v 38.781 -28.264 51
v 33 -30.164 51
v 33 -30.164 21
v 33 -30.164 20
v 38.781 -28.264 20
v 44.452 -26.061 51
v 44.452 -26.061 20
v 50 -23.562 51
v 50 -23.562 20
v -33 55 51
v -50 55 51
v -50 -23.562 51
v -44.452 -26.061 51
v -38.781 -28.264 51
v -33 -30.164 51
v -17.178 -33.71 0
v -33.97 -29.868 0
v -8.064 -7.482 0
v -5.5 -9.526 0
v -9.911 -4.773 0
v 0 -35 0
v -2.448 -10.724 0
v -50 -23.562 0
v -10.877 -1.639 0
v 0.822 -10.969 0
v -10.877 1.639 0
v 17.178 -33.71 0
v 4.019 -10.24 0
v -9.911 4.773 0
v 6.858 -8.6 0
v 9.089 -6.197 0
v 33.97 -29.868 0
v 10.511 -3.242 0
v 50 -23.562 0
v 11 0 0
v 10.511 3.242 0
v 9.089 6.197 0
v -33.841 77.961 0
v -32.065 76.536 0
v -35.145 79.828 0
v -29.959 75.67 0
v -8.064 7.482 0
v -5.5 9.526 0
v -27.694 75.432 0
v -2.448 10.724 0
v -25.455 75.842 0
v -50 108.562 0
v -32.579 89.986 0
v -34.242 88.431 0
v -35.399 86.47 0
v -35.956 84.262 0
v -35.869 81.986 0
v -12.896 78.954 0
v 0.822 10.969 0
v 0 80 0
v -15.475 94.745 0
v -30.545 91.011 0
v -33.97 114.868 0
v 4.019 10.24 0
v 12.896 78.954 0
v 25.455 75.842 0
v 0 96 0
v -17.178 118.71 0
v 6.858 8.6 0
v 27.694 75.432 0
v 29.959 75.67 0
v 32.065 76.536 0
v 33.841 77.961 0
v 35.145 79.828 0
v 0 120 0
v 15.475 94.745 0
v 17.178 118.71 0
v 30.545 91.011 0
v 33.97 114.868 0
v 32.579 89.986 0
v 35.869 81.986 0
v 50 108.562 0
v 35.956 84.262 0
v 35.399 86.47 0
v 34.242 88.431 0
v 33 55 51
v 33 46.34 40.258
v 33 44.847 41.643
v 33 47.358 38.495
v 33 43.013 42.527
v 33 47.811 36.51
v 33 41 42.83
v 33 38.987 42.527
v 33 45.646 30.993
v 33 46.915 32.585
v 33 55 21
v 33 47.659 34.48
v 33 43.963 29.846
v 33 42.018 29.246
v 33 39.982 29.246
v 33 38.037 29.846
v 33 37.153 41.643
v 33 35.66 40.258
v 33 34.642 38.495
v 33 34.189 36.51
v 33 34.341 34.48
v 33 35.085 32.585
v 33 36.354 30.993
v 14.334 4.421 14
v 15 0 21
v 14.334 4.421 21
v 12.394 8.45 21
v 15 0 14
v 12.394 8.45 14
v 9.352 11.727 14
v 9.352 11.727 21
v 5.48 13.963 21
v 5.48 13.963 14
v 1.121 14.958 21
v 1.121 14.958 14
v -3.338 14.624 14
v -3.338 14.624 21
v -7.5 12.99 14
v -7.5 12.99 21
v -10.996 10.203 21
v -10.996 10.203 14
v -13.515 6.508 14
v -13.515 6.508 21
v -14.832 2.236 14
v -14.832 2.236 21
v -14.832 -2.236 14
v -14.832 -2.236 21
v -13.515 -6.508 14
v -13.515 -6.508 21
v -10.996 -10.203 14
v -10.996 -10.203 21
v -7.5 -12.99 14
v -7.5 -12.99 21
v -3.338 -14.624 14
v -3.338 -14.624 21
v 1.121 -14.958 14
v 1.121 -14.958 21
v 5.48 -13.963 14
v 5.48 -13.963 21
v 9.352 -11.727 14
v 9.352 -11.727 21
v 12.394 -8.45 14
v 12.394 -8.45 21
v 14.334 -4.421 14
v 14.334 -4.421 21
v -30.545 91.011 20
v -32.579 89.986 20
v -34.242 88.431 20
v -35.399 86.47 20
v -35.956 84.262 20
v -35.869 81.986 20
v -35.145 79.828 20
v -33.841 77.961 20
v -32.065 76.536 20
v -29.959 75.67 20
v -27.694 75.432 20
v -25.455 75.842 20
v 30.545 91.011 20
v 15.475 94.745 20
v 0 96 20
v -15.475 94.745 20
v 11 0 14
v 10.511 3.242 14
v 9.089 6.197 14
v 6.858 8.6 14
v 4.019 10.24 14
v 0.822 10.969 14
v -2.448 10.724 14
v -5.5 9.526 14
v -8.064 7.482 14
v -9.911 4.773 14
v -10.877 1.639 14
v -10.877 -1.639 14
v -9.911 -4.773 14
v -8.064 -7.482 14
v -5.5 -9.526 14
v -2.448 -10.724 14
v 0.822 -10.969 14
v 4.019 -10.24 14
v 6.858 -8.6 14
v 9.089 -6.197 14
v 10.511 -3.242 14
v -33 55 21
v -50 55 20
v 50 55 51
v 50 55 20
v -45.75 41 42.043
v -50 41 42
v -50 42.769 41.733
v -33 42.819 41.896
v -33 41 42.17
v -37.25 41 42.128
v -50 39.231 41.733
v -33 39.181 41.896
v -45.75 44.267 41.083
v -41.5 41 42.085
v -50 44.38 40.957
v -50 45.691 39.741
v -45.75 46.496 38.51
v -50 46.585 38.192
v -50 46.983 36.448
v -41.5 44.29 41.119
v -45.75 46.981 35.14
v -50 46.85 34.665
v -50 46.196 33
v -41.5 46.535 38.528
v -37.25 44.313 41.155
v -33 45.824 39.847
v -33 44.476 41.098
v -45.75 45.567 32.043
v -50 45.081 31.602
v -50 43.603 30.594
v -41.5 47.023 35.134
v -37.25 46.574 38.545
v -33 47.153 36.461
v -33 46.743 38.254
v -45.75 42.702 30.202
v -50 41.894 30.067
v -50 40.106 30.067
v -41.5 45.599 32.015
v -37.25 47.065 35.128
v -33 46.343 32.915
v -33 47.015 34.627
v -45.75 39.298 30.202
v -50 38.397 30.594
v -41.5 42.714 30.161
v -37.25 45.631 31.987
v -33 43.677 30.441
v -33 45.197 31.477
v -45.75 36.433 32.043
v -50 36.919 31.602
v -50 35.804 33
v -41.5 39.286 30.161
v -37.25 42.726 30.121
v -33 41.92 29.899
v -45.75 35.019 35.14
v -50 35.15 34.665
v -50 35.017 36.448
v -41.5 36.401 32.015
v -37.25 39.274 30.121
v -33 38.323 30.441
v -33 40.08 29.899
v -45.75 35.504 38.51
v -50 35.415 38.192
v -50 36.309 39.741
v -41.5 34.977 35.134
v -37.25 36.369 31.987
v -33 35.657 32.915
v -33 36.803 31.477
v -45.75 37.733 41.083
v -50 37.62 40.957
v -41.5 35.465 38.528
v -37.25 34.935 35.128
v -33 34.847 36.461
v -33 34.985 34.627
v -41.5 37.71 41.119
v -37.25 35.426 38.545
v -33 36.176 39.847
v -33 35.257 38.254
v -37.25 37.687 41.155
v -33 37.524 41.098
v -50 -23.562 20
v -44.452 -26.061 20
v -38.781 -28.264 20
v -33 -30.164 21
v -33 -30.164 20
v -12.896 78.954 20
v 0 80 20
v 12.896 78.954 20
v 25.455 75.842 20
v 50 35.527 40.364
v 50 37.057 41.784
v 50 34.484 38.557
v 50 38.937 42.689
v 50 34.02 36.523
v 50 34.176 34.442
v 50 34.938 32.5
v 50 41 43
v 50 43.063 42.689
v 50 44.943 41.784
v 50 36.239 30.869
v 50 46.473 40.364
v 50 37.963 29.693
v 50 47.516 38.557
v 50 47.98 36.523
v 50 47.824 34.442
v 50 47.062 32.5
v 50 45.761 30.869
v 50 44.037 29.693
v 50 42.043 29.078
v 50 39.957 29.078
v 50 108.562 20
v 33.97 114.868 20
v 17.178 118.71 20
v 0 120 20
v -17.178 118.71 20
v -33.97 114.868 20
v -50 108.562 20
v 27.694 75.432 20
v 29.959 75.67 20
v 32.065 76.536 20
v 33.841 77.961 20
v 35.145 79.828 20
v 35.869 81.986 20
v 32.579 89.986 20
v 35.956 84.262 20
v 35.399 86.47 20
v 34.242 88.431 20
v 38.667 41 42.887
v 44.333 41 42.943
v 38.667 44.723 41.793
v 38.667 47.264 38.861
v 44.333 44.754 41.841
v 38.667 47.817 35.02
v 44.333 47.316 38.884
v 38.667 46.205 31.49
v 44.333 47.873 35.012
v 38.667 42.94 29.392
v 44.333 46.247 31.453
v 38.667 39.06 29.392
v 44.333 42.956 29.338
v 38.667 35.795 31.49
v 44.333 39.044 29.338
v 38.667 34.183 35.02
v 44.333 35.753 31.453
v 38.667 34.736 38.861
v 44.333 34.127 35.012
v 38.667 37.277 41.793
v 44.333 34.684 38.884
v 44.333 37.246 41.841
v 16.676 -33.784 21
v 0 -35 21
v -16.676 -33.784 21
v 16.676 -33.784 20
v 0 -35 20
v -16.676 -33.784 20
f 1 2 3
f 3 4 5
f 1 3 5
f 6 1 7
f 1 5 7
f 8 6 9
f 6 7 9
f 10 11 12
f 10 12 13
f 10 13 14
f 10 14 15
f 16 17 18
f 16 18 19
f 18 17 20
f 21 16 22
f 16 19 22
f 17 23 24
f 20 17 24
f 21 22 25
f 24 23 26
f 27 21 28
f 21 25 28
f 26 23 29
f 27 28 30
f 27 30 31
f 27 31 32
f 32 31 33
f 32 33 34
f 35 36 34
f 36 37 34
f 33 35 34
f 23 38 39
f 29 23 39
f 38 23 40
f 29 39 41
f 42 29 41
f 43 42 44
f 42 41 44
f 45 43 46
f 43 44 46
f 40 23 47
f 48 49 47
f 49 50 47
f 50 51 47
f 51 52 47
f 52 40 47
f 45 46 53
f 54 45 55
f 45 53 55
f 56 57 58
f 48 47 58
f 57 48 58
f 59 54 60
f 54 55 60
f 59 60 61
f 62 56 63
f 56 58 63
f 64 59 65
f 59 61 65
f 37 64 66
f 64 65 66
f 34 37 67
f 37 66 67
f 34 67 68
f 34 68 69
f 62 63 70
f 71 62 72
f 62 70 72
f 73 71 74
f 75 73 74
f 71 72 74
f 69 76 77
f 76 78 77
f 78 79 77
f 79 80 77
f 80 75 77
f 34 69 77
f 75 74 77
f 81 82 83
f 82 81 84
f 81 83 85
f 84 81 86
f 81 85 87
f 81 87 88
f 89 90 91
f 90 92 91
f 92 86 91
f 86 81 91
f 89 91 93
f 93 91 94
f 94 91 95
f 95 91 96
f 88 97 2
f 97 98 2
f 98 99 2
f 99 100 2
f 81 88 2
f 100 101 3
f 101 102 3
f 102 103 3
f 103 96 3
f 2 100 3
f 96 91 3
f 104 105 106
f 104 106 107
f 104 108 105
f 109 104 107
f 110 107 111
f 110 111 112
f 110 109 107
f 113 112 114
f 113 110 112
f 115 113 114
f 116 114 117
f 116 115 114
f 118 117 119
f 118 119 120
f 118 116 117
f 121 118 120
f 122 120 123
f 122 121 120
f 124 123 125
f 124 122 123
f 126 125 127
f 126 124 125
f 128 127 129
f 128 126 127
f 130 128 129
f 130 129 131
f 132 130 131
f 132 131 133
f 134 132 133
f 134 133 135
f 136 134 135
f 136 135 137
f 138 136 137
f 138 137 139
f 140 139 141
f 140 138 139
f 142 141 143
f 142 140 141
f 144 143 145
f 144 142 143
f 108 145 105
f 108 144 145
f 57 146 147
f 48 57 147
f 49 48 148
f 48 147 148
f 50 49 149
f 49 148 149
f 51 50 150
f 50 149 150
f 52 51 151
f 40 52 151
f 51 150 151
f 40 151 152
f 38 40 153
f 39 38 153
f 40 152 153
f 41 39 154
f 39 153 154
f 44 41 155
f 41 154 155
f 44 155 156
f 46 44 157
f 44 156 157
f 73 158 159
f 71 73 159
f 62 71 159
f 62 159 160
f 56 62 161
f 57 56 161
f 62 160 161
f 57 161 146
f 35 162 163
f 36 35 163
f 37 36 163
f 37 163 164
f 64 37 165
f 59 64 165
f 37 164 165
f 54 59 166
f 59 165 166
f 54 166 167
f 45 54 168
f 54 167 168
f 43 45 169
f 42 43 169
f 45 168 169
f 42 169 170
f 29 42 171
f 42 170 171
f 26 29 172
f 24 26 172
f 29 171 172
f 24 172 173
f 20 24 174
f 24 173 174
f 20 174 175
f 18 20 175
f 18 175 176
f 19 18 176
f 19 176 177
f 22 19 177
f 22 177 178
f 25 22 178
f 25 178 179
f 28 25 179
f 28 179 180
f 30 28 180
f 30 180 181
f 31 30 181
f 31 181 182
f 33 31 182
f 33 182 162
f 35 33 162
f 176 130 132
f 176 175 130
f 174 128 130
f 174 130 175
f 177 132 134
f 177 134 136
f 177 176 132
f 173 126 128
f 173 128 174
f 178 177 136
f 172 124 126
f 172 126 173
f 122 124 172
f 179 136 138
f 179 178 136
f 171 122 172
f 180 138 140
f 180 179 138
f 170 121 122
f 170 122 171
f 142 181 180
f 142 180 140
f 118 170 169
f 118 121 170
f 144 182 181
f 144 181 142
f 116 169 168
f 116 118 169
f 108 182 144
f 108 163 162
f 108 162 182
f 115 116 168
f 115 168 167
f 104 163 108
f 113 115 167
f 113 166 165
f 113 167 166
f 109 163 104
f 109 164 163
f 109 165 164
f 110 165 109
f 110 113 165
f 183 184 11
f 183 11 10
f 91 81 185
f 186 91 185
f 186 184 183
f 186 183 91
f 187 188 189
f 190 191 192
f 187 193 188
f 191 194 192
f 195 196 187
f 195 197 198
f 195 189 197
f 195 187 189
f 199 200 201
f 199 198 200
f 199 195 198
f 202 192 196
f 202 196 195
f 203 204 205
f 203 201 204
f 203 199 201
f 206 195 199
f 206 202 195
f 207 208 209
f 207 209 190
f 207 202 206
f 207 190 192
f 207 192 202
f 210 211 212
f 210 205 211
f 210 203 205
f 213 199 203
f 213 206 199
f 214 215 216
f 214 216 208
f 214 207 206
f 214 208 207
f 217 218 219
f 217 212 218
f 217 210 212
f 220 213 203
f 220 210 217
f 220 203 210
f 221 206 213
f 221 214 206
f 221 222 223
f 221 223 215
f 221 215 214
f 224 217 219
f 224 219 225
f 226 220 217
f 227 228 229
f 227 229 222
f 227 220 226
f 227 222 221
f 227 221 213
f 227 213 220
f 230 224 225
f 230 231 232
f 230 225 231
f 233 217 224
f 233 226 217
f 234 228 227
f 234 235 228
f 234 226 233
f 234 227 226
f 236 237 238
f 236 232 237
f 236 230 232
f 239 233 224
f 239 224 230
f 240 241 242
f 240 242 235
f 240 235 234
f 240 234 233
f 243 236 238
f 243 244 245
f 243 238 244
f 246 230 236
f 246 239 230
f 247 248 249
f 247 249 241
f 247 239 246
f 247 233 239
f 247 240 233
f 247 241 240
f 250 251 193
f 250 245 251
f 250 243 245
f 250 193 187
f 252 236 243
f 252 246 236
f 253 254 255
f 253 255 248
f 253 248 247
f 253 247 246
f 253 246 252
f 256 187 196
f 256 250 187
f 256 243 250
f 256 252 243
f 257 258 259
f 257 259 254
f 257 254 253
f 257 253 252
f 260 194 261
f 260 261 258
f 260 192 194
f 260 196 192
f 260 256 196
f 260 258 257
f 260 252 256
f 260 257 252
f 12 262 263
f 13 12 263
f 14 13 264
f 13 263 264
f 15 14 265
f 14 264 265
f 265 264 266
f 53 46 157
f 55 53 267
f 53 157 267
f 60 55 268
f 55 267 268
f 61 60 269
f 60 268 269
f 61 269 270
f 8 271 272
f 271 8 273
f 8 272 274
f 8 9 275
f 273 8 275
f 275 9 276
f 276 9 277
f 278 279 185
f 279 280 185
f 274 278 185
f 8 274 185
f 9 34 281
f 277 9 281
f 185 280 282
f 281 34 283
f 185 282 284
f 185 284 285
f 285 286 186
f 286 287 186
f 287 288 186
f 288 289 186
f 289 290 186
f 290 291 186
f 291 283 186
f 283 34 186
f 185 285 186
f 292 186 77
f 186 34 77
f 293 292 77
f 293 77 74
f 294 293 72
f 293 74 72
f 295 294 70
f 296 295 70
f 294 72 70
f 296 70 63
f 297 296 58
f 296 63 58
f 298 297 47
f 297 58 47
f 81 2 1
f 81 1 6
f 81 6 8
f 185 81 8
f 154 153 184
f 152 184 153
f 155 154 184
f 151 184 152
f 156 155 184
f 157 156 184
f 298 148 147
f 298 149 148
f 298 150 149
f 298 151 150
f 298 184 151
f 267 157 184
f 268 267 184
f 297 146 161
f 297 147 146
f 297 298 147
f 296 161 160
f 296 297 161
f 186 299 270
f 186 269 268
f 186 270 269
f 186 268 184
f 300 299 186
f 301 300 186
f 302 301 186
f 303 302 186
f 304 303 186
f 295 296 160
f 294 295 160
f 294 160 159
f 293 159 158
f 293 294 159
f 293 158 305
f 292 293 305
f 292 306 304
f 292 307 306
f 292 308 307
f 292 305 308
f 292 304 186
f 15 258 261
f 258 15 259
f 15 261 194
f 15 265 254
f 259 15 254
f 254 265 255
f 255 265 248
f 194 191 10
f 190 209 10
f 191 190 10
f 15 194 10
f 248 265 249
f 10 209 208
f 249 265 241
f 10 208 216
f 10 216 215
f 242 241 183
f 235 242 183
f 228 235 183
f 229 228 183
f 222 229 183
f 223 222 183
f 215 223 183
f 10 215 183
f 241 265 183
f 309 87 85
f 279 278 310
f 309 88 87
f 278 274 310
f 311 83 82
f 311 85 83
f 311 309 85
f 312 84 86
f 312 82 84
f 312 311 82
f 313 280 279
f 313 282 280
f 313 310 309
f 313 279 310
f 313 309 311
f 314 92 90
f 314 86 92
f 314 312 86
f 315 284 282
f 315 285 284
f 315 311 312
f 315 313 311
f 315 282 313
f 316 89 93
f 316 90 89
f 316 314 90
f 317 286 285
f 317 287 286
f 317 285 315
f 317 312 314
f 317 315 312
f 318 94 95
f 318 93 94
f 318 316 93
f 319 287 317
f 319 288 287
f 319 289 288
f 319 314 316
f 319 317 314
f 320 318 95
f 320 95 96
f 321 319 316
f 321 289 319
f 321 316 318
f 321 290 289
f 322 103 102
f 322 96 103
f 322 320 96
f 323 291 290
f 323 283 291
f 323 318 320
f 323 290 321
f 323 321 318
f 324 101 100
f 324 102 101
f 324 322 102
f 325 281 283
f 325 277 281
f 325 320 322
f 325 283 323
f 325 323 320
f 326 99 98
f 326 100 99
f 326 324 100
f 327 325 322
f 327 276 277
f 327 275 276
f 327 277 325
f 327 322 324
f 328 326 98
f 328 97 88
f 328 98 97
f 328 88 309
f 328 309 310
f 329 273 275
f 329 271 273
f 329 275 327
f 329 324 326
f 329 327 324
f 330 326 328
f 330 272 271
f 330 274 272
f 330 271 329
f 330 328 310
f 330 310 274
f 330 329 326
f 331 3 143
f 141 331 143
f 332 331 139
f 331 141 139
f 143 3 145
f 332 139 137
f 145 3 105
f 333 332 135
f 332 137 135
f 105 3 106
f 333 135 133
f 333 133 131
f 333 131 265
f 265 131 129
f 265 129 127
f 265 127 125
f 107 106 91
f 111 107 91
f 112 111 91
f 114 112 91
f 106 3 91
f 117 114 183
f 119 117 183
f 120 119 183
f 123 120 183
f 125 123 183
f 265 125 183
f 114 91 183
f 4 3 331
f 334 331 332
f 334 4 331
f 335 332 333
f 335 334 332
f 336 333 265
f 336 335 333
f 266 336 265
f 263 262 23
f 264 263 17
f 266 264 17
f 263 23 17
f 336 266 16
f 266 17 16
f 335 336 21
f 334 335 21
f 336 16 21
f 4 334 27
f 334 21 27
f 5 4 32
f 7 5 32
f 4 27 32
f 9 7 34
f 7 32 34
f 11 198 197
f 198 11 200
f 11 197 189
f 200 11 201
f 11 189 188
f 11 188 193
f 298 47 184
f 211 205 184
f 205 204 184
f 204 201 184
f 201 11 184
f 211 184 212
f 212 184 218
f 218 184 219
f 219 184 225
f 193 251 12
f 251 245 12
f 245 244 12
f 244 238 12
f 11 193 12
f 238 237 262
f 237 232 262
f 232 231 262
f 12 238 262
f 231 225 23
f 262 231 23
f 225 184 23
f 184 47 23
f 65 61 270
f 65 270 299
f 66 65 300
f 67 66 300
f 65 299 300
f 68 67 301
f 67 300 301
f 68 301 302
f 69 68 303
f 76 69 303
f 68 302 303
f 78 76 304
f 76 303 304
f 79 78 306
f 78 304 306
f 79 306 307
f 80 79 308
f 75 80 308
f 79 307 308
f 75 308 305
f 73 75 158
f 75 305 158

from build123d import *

# Parameters (mm, degrees)
BOSS_EXTRUDE1_DEPTH = 20
BOSS_EXTRUDE2_DEPTH = 31
SKETCH8_R           = 15
SKETCH8_R_2         = 11
CUT_EXTRUDE4_DEPTH  = 6
SKETCH8_2_R         = 11
CUT_EXTRUDE5_DEPTH  = 134.645052284
SKETCH10_R          = 6
SKETCH9_R           = 7
CUT_EXTRUDE6_DEPTH  = 134.645052321
SKETCH12_R          = 15
BOSS_EXTRUDE3_DEPTH = 1


with BuildPart() as part:
    # Sketch1 → Boss-Extrude1 (new body)
    with BuildSketch(Plane.XY):
        with BuildLine():
            ThreePointArc((50, 108.561575886), (0, 120), (-50, 108.561575886))
            Line((-50, 108.561575886), (-50, -23.561575886))
            ThreePointArc((-50, -23.561575886), (0, -35), (50, -23.561575886))
            Line((50, -23.561575886), (50, 108.561575886))
        make_face()
    extrude(amount=BOSS_EXTRUDE1_DEPTH)

    # Sketch2 → Boss-Extrude2 (add)
    with BuildSketch(Plane.XY.offset(20)):
        with BuildLine():
            Line((-50, 55), (-50, -23.561575886))
            ThreePointArc((-50, -23.561575886), (-41.631074926, -27.200063435), (-33, -30.163514831))
            Line((-33, -30.163514831), (-33, 55))
            Line((-33, 55), (-50, 55))
        make_face()
        with BuildLine():
            Line((33, 55), (33, -30.163514831))
            ThreePointArc((33, -30.163514831), (41.631074926, -27.200063435), (50, -23.561575886))
            Line((50, -23.561575886), (50, 55))
            Line((50, 55), (33, 55))
        make_face()
    extrude(amount=BOSS_EXTRUDE2_DEPTH)

    # Sketch8 → Cut-Extrude4 (cut)
    with BuildSketch(Plane.XY.offset(20)):
        Circle(SKETCH8_R)
        Circle(SKETCH8_R_2, mode=Mode.SUBTRACT)
    extrude(amount=-CUT_EXTRUDE4_DEPTH, mode=Mode.SUBTRACT)

    # Sketch8<2> → Cut-Extrude5 (cut, through all)
    with BuildSketch(Plane.XY.offset(20)):
        Circle(SKETCH8_2_R)
    extrude(amount=-CUT_EXTRUDE5_DEPTH, mode=Mode.SUBTRACT)

    # Sketch10 → Cut-Loft1 section 0
    with BuildSketch(Plane.ZY.offset(50)):
        with Locations((36, 41)):
            Circle(SKETCH10_R)
    # Sketch9 → Cut-Loft1 section 1
    with BuildSketch(Plane(origin=(50, 0, 0), x_dir=(0, 0, -1), z_dir=(1, 0, 0))):
        with Locations((-36, 41)):
            Circle(SKETCH9_R)
    loft(mode=Mode.SUBTRACT)

    # Sketch11 → Cut-Extrude6 (cut, through all)
    with BuildSketch(Plane.XY.offset(20)):
        with BuildLine():
            ThreePointArc((30.545454545, 91.010852136), (0, 96), (-30.545454545, 91.010852136))
            ThreePointArc((-30.545454545, 91.010852136), (-35.584237678, 80.881159913), (-25.454545455, 75.84237678))
            ThreePointArc((-25.454545455, 75.84237678), (0, 80), (25.454545455, 75.84237678))
            ThreePointArc((25.454545455, 75.84237678), (35.584237678, 80.881159913), (30.545454545, 91.010852136))
        make_face()
    extrude(amount=-CUT_EXTRUDE6_DEPTH, mode=Mode.SUBTRACT)

    # Sketch12 → Boss-Extrude3 (add)
    with BuildSketch(Plane.XY.offset(20)):
        with BuildLine():
            Line((-33, 55), (-33, -30.163514831))
            ThreePointArc((-33, -30.163514831), (0, -35), (33, -30.163514831))
            Line((33, -30.163514831), (33, 55))
            Line((33, 55), (-33, 55))
        make_face()
        Circle(SKETCH12_R, mode=Mode.SUBTRACT)
    extrude(amount=BOSS_EXTRUDE3_DEPTH)


solid = part.part
